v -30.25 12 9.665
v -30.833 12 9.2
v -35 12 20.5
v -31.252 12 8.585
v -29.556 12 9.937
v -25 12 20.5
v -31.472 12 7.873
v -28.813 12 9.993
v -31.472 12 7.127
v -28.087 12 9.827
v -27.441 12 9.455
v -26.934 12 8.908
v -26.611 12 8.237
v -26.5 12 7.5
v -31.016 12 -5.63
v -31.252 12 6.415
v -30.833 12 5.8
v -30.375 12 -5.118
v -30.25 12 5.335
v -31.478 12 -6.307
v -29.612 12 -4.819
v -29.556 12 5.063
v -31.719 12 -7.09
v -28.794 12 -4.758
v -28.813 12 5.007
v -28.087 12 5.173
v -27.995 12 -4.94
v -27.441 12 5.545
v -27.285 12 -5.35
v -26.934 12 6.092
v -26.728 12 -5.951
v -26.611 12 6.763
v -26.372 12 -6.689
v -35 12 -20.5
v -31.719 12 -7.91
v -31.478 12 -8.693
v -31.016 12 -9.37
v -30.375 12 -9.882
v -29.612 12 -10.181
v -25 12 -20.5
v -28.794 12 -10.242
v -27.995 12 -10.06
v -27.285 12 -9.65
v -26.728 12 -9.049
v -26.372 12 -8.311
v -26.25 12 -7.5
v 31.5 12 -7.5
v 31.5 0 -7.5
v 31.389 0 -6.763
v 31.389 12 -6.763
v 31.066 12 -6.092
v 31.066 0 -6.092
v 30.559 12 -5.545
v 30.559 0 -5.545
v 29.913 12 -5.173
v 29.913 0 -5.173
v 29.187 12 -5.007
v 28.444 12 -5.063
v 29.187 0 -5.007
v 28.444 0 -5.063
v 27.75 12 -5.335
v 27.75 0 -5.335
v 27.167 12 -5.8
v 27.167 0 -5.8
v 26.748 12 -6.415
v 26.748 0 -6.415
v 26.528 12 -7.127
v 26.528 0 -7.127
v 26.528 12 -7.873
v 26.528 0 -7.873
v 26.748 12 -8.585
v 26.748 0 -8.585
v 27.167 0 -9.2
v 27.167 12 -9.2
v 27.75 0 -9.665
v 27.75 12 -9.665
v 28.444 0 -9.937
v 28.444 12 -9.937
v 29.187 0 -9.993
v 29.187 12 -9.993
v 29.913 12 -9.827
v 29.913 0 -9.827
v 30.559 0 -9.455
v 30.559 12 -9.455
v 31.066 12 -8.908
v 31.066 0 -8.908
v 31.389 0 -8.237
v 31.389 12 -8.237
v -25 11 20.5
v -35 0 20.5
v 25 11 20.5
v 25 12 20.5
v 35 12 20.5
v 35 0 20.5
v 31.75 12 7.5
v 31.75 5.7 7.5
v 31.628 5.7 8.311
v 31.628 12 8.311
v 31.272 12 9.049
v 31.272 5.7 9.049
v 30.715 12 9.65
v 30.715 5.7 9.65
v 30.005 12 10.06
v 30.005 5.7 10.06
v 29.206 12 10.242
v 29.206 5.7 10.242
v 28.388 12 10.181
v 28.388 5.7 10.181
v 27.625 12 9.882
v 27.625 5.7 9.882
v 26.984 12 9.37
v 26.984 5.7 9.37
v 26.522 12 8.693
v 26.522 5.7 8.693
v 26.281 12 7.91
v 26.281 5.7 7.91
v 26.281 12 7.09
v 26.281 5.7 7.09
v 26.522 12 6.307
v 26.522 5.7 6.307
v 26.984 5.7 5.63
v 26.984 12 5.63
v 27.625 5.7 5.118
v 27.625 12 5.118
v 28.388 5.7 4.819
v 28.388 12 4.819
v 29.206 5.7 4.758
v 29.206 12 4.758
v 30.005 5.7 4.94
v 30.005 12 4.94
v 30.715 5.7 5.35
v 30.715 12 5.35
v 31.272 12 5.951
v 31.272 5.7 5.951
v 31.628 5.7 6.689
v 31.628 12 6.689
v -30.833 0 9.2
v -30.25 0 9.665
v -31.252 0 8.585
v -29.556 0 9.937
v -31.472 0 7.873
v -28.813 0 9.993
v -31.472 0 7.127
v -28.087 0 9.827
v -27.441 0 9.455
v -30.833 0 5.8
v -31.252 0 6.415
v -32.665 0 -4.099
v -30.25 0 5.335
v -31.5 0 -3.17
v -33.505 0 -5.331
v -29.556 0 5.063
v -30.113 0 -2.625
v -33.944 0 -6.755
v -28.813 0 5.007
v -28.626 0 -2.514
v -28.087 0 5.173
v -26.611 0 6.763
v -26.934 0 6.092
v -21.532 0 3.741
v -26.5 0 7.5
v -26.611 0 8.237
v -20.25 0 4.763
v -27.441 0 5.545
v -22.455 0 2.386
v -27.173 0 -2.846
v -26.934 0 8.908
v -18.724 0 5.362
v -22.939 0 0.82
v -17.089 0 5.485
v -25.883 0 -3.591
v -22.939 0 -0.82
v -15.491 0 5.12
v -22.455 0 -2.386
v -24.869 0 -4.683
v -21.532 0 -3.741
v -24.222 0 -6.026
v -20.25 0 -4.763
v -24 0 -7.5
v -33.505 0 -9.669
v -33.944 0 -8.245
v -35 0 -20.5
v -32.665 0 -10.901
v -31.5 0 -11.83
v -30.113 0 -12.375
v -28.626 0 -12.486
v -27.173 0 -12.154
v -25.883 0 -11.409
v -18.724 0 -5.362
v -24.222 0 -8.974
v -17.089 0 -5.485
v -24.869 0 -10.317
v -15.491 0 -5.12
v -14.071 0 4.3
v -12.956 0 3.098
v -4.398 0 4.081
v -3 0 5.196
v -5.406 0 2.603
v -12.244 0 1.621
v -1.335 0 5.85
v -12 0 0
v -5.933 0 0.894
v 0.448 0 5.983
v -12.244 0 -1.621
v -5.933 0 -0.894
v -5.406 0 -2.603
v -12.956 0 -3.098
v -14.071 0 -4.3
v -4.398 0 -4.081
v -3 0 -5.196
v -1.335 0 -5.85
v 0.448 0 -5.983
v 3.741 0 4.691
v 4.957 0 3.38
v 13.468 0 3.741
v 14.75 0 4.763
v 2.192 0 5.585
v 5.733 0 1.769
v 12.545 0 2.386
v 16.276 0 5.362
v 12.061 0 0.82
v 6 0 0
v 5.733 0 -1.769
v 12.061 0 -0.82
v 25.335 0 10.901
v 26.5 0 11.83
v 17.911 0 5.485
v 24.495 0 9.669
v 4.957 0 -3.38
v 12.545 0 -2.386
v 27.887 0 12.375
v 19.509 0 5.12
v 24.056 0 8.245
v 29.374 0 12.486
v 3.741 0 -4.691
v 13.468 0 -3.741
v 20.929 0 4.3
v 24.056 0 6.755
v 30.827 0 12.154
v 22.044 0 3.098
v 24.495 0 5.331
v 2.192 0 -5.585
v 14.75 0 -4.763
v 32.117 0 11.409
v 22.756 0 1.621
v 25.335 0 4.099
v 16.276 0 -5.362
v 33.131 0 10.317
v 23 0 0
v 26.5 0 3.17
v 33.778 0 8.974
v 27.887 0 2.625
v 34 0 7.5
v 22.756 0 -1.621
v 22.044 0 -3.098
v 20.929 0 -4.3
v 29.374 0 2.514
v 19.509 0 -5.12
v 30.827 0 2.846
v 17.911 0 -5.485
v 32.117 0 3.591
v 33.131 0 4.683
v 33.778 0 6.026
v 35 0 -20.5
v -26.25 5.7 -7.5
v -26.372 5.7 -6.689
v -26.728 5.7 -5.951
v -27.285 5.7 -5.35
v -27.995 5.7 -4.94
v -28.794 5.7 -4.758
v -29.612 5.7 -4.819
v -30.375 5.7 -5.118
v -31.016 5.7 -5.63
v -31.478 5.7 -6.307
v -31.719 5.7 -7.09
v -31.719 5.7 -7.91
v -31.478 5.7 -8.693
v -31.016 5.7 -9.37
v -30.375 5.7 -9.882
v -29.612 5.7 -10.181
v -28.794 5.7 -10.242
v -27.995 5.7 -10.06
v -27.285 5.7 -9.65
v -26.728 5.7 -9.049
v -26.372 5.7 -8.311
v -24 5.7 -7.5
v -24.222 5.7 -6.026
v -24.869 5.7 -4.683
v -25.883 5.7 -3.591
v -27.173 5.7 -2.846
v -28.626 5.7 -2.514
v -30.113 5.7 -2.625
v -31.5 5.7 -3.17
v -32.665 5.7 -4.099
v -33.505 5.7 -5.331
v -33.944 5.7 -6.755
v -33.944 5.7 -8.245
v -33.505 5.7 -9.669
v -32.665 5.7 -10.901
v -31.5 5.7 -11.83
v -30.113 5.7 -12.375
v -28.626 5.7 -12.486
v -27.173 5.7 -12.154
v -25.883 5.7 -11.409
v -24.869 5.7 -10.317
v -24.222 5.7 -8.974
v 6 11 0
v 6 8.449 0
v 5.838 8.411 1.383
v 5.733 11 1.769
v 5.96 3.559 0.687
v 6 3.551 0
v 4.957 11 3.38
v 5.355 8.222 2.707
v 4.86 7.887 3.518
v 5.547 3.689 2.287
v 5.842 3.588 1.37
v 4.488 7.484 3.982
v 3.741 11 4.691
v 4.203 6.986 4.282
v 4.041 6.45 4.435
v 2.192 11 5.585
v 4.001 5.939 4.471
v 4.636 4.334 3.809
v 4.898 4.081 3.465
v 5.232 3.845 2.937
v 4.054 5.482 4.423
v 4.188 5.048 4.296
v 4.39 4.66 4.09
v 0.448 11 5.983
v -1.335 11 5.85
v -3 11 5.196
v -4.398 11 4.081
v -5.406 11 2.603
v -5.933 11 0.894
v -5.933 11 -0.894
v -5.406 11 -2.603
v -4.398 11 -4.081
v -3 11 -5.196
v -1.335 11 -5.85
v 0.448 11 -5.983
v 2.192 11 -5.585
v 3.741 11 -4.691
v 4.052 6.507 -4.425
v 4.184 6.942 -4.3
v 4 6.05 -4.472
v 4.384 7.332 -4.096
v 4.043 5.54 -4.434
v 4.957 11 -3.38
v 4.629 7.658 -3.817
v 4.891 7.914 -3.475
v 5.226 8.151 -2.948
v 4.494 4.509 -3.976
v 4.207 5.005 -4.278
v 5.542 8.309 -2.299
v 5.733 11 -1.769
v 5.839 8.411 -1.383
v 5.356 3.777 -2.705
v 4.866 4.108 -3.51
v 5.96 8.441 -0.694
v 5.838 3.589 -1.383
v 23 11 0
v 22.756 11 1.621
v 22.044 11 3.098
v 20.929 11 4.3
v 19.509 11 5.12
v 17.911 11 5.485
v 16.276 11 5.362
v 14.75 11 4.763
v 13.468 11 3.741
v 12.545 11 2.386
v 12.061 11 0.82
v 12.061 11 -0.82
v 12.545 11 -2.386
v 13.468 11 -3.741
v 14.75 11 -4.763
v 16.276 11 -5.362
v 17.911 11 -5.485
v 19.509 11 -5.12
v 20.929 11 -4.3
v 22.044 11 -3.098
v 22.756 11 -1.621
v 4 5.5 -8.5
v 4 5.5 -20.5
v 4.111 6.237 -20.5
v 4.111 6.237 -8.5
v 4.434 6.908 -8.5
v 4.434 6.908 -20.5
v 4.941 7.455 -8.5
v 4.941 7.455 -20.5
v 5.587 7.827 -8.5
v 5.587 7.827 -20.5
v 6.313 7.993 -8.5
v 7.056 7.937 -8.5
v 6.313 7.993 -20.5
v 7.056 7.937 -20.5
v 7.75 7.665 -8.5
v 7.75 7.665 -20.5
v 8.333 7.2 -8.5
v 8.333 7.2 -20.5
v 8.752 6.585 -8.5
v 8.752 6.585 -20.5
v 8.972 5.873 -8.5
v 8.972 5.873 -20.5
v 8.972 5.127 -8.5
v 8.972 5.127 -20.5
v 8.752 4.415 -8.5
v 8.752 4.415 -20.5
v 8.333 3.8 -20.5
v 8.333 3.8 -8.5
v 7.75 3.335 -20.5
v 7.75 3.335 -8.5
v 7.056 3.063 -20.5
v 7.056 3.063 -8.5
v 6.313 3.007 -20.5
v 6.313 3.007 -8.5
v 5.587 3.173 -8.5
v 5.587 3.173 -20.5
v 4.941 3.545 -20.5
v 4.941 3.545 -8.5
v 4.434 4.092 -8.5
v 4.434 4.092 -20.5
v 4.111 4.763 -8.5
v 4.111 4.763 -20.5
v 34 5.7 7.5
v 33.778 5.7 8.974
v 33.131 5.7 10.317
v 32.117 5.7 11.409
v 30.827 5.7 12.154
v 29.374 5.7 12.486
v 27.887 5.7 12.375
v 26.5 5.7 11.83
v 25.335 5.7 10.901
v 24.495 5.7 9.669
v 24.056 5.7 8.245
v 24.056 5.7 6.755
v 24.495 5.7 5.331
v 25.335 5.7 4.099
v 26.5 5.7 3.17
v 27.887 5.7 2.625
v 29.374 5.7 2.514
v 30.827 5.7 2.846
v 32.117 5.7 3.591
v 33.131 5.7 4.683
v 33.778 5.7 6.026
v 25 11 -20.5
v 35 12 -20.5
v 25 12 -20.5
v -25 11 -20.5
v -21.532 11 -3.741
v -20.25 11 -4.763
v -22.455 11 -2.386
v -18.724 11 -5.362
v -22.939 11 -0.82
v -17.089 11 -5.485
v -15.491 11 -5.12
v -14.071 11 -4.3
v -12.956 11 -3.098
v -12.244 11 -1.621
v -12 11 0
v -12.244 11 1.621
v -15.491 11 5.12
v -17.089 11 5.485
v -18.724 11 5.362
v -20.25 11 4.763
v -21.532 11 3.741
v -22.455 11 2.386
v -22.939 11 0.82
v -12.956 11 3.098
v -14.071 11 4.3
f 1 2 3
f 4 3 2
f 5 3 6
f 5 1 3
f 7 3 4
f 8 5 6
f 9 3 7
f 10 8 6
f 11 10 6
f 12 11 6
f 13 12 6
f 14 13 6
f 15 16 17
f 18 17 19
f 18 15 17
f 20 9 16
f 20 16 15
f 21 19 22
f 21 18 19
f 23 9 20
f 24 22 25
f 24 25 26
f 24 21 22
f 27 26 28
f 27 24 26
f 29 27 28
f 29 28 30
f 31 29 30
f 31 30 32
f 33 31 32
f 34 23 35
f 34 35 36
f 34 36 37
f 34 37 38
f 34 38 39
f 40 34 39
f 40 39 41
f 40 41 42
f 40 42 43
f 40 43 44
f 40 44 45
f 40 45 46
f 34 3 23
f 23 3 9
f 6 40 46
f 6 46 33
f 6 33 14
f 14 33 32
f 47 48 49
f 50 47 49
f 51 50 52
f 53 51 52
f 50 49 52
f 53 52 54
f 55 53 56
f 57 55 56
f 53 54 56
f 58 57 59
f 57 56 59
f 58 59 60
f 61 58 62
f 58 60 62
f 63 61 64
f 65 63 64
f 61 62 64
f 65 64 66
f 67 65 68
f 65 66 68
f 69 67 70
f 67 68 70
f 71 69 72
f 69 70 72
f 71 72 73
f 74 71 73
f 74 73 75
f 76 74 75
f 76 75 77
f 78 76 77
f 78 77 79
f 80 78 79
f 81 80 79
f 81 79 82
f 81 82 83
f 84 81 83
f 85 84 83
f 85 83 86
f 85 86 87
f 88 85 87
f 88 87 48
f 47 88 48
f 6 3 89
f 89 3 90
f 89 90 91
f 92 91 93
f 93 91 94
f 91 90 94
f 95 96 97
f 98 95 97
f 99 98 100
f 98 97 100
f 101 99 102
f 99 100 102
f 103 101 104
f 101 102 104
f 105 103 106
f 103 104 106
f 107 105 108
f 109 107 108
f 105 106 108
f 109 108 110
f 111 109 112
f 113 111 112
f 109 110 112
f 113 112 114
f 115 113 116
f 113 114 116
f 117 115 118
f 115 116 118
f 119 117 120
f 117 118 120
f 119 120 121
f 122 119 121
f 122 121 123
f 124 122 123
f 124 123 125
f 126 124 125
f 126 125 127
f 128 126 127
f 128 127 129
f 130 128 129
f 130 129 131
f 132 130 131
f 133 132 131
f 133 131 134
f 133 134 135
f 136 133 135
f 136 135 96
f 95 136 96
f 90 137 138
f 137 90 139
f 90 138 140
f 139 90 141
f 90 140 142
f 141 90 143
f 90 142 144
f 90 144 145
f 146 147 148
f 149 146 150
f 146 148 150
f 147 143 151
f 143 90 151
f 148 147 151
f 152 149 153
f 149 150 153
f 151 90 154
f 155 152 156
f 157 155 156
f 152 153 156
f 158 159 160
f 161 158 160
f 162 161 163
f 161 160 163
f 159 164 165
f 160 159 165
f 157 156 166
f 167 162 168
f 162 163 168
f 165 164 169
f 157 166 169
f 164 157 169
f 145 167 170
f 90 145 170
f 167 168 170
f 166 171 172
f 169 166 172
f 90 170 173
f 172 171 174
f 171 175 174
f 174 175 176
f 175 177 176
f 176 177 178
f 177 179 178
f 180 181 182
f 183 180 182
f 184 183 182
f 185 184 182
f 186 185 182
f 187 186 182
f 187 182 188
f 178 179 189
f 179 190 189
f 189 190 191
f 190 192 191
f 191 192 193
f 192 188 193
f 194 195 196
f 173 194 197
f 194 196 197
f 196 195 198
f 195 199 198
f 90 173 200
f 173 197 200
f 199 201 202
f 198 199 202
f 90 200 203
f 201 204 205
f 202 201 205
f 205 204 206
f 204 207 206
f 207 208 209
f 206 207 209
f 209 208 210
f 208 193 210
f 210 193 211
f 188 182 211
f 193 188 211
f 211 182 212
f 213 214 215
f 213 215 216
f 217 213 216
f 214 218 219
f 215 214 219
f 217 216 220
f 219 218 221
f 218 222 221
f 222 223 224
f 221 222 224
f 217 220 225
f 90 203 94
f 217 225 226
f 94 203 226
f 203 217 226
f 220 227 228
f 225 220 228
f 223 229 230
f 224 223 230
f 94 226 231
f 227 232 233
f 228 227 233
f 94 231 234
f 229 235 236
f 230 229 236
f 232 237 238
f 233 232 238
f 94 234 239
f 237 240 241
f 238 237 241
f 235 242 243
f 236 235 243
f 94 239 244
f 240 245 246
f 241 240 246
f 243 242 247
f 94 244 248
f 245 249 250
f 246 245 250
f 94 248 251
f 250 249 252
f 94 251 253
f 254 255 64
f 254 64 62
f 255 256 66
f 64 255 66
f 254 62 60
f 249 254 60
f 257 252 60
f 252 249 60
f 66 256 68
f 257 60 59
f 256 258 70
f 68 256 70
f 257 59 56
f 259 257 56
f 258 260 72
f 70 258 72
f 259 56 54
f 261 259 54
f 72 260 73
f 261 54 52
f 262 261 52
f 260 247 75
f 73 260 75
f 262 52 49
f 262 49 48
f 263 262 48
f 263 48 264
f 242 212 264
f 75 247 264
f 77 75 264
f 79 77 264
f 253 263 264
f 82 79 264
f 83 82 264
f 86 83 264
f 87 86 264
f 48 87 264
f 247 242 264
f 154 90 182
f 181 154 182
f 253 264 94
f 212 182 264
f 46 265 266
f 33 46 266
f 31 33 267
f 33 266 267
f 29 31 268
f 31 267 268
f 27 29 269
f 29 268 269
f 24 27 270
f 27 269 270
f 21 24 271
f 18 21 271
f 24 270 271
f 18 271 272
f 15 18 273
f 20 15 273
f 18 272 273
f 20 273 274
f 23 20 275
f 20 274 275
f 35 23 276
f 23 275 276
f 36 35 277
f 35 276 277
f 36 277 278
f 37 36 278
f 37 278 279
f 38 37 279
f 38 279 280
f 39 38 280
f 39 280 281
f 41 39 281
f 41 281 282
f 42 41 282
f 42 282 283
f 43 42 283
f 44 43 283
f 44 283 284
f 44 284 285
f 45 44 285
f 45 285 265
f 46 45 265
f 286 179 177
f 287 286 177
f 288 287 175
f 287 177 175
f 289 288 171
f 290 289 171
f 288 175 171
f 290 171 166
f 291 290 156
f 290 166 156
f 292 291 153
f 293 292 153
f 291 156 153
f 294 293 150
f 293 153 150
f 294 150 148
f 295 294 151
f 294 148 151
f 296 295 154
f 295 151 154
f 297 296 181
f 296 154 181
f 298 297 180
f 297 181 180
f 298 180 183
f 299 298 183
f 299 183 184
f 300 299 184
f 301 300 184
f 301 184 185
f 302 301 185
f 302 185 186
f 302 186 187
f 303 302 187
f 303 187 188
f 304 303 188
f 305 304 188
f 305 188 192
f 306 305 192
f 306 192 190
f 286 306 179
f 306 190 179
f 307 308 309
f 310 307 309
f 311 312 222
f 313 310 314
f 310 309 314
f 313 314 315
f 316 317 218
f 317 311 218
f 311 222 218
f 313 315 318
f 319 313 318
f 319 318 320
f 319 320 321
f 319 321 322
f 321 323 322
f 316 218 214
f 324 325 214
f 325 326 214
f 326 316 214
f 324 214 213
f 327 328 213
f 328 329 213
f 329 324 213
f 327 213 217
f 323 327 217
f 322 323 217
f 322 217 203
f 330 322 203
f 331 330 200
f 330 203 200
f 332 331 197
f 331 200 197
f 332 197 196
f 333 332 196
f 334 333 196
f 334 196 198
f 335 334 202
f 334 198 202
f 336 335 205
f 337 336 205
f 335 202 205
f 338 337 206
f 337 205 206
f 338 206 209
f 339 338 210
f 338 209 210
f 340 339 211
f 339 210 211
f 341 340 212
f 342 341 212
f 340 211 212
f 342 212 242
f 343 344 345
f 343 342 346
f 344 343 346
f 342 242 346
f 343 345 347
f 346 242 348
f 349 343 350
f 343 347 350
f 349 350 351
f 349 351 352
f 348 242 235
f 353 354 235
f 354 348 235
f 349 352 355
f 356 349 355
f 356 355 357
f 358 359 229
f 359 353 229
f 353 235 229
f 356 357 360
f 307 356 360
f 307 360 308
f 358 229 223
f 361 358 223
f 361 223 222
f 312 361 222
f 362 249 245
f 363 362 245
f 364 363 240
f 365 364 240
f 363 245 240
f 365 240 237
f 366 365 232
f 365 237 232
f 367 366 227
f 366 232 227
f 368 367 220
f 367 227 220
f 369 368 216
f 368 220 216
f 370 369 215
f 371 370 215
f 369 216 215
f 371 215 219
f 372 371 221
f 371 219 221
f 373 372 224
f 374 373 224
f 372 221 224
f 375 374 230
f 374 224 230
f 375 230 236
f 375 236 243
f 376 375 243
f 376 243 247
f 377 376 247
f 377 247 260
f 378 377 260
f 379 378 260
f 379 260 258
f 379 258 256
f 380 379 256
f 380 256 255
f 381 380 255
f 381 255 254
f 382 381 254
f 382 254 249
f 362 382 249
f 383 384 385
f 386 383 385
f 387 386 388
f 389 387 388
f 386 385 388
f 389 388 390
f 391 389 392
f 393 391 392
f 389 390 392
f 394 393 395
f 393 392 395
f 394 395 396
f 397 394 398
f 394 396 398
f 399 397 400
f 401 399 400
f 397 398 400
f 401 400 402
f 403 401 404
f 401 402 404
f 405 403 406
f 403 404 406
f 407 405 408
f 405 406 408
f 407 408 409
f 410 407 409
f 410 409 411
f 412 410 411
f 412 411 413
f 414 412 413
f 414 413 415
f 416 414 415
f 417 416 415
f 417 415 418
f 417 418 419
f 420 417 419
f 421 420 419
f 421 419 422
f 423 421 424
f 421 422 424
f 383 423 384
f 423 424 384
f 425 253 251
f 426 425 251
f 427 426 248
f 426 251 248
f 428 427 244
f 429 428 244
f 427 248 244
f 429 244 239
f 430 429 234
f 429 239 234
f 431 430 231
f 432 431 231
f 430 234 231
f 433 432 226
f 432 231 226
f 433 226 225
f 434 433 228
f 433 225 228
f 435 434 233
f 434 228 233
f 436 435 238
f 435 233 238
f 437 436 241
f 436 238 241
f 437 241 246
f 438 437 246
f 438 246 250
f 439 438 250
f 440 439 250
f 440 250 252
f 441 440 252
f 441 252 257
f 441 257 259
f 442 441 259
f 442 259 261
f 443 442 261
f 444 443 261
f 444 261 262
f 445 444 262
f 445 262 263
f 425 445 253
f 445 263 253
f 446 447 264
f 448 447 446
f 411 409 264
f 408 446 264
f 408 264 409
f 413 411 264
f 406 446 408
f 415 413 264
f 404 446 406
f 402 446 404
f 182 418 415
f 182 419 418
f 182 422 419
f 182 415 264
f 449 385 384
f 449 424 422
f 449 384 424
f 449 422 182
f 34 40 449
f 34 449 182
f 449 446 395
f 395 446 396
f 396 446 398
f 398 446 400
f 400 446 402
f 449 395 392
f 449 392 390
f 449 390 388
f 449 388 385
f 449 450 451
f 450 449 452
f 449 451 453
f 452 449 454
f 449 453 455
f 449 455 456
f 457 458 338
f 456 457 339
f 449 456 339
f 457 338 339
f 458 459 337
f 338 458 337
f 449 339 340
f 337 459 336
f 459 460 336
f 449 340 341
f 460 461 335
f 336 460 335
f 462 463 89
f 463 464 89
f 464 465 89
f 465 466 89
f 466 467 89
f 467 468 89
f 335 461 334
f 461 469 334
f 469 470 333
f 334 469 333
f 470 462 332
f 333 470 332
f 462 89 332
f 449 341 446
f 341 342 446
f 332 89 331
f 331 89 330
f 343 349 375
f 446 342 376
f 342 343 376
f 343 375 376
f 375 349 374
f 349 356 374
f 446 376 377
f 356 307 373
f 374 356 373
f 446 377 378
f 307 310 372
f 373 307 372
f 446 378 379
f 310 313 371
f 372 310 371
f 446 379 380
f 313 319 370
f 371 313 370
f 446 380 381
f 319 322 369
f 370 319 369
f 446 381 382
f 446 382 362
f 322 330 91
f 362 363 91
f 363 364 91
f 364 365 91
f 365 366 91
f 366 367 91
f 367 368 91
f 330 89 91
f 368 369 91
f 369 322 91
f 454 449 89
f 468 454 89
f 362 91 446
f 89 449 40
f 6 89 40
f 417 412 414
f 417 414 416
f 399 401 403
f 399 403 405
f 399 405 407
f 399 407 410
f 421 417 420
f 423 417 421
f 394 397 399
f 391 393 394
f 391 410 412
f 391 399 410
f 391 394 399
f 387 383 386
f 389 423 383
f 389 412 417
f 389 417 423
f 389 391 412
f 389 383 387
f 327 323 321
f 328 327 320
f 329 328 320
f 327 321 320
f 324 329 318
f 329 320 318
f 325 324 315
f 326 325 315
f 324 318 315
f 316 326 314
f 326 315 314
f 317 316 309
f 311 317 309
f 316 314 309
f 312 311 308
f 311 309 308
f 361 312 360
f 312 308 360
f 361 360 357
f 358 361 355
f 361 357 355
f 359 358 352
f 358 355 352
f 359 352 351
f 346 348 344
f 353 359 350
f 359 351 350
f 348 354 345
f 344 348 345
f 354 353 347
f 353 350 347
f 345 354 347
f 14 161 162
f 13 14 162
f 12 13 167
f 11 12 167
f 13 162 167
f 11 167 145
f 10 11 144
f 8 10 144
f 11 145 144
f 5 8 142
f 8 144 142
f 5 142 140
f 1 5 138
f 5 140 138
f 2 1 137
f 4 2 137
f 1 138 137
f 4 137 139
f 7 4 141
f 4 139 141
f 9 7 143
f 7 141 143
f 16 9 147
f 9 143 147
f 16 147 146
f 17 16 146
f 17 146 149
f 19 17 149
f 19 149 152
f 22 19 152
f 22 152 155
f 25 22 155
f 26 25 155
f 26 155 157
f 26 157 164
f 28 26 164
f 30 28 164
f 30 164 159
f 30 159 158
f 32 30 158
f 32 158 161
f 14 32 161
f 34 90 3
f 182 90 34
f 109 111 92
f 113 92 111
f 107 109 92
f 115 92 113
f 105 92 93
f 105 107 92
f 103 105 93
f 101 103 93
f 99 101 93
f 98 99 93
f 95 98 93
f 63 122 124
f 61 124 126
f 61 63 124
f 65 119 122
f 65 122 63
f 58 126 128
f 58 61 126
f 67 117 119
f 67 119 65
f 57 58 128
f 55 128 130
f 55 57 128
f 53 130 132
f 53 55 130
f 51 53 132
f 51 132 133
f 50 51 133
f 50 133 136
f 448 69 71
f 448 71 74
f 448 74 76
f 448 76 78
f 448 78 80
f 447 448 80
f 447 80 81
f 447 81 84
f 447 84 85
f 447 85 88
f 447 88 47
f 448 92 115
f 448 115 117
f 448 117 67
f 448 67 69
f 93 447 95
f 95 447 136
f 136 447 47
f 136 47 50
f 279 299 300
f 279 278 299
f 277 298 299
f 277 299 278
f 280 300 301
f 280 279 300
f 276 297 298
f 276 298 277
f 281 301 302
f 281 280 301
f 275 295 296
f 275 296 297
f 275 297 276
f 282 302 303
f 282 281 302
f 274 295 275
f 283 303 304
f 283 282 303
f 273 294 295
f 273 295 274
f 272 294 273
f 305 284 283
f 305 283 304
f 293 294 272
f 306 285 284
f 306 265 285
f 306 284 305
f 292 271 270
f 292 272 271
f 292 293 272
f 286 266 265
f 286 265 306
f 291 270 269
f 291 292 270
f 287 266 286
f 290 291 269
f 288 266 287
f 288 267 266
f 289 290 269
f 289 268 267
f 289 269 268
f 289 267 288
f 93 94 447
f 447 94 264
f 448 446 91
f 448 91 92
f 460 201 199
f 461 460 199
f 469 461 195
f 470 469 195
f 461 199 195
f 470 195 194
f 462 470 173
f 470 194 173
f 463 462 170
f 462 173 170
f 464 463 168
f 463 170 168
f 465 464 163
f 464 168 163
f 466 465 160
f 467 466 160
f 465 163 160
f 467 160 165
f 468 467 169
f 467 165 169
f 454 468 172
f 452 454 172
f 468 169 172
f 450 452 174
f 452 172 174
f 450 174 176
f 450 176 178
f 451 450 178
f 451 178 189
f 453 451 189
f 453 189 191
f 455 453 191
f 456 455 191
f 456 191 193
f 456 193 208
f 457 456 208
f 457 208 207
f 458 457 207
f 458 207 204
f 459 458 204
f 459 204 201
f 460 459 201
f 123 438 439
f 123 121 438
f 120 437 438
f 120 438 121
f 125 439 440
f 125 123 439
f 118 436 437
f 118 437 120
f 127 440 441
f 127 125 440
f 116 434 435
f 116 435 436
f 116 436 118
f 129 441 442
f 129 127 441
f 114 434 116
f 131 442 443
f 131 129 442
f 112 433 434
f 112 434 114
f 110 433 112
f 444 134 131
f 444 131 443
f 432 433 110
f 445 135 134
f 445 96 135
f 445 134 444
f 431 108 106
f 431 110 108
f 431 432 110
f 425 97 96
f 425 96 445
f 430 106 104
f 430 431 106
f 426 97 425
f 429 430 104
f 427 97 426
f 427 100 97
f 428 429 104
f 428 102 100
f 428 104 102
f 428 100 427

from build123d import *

# Parameters (mm, degrees)
SKETCH1_W           = 70
SKETCH1_H           = 41
BOSS_EXTRUDE1_DEPTH = 12
SKETCH2_W           = 50
SKETCH2_H           = 1
CUT_EXTRUDE1_DEPTH  = 88
SKETCH3_R           = 2.5
SKETCH3_R_2         = 2.75
CUT_EXTRUDE2_DEPTH  = 88
SKETCH4_R           = 5
CUT_EXTRUDE3_DEPTH  = 5.7
SKETCH5_R           = 2.5
CUT_EXTRUDE4_DEPTH  = 12
SKETCH6_R           = 6
SKETCH6_R_2         = 5.5
CUT_EXTRUDE5_DEPTH  = 39
SKETCH8_R           = 2.5
BOSS_EXTRUDE2_DEPTH = 41
SKETCH9_R           = 2.5
CUT_EXTRUDE6_DEPTH  = 12
SKETCH10_R          = 6
CUT_EXTRUDE7_DEPTH  = 30


with BuildPart() as part:
    # Sketch1 → Boss-Extrude1 (new body)
    with BuildSketch(Plane(origin=(0, 0, 0), x_dir=(1, 0, 0), z_dir=(0, 1, 0))):
        Rectangle(SKETCH1_W, SKETCH1_H)
    extrude(amount=BOSS_EXTRUDE1_DEPTH)

    # Sketch2 → Cut-Extrude1 (cut)
    with BuildSketch(Plane.XY.offset(20.5)):
        with Locations((0, 11.5)):
            Rectangle(SKETCH2_W, SKETCH2_H)
    extrude(amount=-CUT_EXTRUDE1_DEPTH, mode=Mode.SUBTRACT)

    # Sketch3 → Cut-Extrude2 (cut)
    with BuildSketch(Plane.XZ):
        with Locations((29, -7.5)):
            Circle(SKETCH3_R)
        with Locations((-29, 7.5)):
            Circle(SKETCH3_R)
        with Locations((29, 7.5)):
            Circle(SKETCH3_R_2)
        with Locations((-29, -7.5)):
            Circle(SKETCH3_R_2)
    extrude(amount=-CUT_EXTRUDE2_DEPTH, mode=Mode.SUBTRACT)

    # Sketch4 → Cut-Extrude3 (cut)
    with BuildSketch(Plane.XZ):
        with Locations((-29, -7.5)):
            Circle(SKETCH4_R)
        with Locations((29, 7.5)):
            Circle(SKETCH4_R)
    extrude(amount=-CUT_EXTRUDE3_DEPTH, mode=Mode.SUBTRACT)

    # Sketch5 → Cut-Extrude4 (cut)
    with BuildSketch(Plane(origin=(0, 0, -20.5), x_dir=(-1, 0, 0), z_dir=(0, 0, -1))):
        with Locations((-6.5, 6)):
            Circle(SKETCH5_R)
    extrude(amount=-CUT_EXTRUDE4_DEPTH, mode=Mode.SUBTRACT)

    # Sketch6 → Cut-Extrude5 (cut)
    with BuildSketch(Plane.XZ):
        Circle(SKETCH6_R)
        with Locations((-17.5, 0)):
            Circle(SKETCH6_R_2)
        with Locations((17.5, 0)):
            Circle(SKETCH6_R_2)
    extrude(amount=-CUT_EXTRUDE5_DEPTH, mode=Mode.SUBTRACT)

    # Sketch8 → Boss-Extrude2 (add)
    with BuildSketch(Plane(origin=(0, 0, -20.5), x_dir=(-1, 0, 0), z_dir=(0, 0, -1))):
        with Locations((-6.5, 6)):
            Circle(SKETCH8_R)
    extrude(amount=-BOSS_EXTRUDE2_DEPTH)

    # Sketch9 → Cut-Extrude6 (cut)
    with BuildSketch(Plane(origin=(0, 0, -20.5), x_dir=(-1, 0, 0), z_dir=(0, 0, -1))):
        with Locations((-6.5, 5.5)):
            Circle(SKETCH9_R)
    extrude(amount=-CUT_EXTRUDE6_DEPTH, mode=Mode.SUBTRACT)

    # Sketch10 → Cut-Extrude7 (cut)
    with BuildSketch(Plane(origin=(0, 11, 0), x_dir=(1, 0, 0), z_dir=(0, 1, 0))):
        Circle(SKETCH10_R)
    extrude(amount=-CUT_EXTRUDE7_DEPTH, mode=Mode.SUBTRACT)


solid = part.part
